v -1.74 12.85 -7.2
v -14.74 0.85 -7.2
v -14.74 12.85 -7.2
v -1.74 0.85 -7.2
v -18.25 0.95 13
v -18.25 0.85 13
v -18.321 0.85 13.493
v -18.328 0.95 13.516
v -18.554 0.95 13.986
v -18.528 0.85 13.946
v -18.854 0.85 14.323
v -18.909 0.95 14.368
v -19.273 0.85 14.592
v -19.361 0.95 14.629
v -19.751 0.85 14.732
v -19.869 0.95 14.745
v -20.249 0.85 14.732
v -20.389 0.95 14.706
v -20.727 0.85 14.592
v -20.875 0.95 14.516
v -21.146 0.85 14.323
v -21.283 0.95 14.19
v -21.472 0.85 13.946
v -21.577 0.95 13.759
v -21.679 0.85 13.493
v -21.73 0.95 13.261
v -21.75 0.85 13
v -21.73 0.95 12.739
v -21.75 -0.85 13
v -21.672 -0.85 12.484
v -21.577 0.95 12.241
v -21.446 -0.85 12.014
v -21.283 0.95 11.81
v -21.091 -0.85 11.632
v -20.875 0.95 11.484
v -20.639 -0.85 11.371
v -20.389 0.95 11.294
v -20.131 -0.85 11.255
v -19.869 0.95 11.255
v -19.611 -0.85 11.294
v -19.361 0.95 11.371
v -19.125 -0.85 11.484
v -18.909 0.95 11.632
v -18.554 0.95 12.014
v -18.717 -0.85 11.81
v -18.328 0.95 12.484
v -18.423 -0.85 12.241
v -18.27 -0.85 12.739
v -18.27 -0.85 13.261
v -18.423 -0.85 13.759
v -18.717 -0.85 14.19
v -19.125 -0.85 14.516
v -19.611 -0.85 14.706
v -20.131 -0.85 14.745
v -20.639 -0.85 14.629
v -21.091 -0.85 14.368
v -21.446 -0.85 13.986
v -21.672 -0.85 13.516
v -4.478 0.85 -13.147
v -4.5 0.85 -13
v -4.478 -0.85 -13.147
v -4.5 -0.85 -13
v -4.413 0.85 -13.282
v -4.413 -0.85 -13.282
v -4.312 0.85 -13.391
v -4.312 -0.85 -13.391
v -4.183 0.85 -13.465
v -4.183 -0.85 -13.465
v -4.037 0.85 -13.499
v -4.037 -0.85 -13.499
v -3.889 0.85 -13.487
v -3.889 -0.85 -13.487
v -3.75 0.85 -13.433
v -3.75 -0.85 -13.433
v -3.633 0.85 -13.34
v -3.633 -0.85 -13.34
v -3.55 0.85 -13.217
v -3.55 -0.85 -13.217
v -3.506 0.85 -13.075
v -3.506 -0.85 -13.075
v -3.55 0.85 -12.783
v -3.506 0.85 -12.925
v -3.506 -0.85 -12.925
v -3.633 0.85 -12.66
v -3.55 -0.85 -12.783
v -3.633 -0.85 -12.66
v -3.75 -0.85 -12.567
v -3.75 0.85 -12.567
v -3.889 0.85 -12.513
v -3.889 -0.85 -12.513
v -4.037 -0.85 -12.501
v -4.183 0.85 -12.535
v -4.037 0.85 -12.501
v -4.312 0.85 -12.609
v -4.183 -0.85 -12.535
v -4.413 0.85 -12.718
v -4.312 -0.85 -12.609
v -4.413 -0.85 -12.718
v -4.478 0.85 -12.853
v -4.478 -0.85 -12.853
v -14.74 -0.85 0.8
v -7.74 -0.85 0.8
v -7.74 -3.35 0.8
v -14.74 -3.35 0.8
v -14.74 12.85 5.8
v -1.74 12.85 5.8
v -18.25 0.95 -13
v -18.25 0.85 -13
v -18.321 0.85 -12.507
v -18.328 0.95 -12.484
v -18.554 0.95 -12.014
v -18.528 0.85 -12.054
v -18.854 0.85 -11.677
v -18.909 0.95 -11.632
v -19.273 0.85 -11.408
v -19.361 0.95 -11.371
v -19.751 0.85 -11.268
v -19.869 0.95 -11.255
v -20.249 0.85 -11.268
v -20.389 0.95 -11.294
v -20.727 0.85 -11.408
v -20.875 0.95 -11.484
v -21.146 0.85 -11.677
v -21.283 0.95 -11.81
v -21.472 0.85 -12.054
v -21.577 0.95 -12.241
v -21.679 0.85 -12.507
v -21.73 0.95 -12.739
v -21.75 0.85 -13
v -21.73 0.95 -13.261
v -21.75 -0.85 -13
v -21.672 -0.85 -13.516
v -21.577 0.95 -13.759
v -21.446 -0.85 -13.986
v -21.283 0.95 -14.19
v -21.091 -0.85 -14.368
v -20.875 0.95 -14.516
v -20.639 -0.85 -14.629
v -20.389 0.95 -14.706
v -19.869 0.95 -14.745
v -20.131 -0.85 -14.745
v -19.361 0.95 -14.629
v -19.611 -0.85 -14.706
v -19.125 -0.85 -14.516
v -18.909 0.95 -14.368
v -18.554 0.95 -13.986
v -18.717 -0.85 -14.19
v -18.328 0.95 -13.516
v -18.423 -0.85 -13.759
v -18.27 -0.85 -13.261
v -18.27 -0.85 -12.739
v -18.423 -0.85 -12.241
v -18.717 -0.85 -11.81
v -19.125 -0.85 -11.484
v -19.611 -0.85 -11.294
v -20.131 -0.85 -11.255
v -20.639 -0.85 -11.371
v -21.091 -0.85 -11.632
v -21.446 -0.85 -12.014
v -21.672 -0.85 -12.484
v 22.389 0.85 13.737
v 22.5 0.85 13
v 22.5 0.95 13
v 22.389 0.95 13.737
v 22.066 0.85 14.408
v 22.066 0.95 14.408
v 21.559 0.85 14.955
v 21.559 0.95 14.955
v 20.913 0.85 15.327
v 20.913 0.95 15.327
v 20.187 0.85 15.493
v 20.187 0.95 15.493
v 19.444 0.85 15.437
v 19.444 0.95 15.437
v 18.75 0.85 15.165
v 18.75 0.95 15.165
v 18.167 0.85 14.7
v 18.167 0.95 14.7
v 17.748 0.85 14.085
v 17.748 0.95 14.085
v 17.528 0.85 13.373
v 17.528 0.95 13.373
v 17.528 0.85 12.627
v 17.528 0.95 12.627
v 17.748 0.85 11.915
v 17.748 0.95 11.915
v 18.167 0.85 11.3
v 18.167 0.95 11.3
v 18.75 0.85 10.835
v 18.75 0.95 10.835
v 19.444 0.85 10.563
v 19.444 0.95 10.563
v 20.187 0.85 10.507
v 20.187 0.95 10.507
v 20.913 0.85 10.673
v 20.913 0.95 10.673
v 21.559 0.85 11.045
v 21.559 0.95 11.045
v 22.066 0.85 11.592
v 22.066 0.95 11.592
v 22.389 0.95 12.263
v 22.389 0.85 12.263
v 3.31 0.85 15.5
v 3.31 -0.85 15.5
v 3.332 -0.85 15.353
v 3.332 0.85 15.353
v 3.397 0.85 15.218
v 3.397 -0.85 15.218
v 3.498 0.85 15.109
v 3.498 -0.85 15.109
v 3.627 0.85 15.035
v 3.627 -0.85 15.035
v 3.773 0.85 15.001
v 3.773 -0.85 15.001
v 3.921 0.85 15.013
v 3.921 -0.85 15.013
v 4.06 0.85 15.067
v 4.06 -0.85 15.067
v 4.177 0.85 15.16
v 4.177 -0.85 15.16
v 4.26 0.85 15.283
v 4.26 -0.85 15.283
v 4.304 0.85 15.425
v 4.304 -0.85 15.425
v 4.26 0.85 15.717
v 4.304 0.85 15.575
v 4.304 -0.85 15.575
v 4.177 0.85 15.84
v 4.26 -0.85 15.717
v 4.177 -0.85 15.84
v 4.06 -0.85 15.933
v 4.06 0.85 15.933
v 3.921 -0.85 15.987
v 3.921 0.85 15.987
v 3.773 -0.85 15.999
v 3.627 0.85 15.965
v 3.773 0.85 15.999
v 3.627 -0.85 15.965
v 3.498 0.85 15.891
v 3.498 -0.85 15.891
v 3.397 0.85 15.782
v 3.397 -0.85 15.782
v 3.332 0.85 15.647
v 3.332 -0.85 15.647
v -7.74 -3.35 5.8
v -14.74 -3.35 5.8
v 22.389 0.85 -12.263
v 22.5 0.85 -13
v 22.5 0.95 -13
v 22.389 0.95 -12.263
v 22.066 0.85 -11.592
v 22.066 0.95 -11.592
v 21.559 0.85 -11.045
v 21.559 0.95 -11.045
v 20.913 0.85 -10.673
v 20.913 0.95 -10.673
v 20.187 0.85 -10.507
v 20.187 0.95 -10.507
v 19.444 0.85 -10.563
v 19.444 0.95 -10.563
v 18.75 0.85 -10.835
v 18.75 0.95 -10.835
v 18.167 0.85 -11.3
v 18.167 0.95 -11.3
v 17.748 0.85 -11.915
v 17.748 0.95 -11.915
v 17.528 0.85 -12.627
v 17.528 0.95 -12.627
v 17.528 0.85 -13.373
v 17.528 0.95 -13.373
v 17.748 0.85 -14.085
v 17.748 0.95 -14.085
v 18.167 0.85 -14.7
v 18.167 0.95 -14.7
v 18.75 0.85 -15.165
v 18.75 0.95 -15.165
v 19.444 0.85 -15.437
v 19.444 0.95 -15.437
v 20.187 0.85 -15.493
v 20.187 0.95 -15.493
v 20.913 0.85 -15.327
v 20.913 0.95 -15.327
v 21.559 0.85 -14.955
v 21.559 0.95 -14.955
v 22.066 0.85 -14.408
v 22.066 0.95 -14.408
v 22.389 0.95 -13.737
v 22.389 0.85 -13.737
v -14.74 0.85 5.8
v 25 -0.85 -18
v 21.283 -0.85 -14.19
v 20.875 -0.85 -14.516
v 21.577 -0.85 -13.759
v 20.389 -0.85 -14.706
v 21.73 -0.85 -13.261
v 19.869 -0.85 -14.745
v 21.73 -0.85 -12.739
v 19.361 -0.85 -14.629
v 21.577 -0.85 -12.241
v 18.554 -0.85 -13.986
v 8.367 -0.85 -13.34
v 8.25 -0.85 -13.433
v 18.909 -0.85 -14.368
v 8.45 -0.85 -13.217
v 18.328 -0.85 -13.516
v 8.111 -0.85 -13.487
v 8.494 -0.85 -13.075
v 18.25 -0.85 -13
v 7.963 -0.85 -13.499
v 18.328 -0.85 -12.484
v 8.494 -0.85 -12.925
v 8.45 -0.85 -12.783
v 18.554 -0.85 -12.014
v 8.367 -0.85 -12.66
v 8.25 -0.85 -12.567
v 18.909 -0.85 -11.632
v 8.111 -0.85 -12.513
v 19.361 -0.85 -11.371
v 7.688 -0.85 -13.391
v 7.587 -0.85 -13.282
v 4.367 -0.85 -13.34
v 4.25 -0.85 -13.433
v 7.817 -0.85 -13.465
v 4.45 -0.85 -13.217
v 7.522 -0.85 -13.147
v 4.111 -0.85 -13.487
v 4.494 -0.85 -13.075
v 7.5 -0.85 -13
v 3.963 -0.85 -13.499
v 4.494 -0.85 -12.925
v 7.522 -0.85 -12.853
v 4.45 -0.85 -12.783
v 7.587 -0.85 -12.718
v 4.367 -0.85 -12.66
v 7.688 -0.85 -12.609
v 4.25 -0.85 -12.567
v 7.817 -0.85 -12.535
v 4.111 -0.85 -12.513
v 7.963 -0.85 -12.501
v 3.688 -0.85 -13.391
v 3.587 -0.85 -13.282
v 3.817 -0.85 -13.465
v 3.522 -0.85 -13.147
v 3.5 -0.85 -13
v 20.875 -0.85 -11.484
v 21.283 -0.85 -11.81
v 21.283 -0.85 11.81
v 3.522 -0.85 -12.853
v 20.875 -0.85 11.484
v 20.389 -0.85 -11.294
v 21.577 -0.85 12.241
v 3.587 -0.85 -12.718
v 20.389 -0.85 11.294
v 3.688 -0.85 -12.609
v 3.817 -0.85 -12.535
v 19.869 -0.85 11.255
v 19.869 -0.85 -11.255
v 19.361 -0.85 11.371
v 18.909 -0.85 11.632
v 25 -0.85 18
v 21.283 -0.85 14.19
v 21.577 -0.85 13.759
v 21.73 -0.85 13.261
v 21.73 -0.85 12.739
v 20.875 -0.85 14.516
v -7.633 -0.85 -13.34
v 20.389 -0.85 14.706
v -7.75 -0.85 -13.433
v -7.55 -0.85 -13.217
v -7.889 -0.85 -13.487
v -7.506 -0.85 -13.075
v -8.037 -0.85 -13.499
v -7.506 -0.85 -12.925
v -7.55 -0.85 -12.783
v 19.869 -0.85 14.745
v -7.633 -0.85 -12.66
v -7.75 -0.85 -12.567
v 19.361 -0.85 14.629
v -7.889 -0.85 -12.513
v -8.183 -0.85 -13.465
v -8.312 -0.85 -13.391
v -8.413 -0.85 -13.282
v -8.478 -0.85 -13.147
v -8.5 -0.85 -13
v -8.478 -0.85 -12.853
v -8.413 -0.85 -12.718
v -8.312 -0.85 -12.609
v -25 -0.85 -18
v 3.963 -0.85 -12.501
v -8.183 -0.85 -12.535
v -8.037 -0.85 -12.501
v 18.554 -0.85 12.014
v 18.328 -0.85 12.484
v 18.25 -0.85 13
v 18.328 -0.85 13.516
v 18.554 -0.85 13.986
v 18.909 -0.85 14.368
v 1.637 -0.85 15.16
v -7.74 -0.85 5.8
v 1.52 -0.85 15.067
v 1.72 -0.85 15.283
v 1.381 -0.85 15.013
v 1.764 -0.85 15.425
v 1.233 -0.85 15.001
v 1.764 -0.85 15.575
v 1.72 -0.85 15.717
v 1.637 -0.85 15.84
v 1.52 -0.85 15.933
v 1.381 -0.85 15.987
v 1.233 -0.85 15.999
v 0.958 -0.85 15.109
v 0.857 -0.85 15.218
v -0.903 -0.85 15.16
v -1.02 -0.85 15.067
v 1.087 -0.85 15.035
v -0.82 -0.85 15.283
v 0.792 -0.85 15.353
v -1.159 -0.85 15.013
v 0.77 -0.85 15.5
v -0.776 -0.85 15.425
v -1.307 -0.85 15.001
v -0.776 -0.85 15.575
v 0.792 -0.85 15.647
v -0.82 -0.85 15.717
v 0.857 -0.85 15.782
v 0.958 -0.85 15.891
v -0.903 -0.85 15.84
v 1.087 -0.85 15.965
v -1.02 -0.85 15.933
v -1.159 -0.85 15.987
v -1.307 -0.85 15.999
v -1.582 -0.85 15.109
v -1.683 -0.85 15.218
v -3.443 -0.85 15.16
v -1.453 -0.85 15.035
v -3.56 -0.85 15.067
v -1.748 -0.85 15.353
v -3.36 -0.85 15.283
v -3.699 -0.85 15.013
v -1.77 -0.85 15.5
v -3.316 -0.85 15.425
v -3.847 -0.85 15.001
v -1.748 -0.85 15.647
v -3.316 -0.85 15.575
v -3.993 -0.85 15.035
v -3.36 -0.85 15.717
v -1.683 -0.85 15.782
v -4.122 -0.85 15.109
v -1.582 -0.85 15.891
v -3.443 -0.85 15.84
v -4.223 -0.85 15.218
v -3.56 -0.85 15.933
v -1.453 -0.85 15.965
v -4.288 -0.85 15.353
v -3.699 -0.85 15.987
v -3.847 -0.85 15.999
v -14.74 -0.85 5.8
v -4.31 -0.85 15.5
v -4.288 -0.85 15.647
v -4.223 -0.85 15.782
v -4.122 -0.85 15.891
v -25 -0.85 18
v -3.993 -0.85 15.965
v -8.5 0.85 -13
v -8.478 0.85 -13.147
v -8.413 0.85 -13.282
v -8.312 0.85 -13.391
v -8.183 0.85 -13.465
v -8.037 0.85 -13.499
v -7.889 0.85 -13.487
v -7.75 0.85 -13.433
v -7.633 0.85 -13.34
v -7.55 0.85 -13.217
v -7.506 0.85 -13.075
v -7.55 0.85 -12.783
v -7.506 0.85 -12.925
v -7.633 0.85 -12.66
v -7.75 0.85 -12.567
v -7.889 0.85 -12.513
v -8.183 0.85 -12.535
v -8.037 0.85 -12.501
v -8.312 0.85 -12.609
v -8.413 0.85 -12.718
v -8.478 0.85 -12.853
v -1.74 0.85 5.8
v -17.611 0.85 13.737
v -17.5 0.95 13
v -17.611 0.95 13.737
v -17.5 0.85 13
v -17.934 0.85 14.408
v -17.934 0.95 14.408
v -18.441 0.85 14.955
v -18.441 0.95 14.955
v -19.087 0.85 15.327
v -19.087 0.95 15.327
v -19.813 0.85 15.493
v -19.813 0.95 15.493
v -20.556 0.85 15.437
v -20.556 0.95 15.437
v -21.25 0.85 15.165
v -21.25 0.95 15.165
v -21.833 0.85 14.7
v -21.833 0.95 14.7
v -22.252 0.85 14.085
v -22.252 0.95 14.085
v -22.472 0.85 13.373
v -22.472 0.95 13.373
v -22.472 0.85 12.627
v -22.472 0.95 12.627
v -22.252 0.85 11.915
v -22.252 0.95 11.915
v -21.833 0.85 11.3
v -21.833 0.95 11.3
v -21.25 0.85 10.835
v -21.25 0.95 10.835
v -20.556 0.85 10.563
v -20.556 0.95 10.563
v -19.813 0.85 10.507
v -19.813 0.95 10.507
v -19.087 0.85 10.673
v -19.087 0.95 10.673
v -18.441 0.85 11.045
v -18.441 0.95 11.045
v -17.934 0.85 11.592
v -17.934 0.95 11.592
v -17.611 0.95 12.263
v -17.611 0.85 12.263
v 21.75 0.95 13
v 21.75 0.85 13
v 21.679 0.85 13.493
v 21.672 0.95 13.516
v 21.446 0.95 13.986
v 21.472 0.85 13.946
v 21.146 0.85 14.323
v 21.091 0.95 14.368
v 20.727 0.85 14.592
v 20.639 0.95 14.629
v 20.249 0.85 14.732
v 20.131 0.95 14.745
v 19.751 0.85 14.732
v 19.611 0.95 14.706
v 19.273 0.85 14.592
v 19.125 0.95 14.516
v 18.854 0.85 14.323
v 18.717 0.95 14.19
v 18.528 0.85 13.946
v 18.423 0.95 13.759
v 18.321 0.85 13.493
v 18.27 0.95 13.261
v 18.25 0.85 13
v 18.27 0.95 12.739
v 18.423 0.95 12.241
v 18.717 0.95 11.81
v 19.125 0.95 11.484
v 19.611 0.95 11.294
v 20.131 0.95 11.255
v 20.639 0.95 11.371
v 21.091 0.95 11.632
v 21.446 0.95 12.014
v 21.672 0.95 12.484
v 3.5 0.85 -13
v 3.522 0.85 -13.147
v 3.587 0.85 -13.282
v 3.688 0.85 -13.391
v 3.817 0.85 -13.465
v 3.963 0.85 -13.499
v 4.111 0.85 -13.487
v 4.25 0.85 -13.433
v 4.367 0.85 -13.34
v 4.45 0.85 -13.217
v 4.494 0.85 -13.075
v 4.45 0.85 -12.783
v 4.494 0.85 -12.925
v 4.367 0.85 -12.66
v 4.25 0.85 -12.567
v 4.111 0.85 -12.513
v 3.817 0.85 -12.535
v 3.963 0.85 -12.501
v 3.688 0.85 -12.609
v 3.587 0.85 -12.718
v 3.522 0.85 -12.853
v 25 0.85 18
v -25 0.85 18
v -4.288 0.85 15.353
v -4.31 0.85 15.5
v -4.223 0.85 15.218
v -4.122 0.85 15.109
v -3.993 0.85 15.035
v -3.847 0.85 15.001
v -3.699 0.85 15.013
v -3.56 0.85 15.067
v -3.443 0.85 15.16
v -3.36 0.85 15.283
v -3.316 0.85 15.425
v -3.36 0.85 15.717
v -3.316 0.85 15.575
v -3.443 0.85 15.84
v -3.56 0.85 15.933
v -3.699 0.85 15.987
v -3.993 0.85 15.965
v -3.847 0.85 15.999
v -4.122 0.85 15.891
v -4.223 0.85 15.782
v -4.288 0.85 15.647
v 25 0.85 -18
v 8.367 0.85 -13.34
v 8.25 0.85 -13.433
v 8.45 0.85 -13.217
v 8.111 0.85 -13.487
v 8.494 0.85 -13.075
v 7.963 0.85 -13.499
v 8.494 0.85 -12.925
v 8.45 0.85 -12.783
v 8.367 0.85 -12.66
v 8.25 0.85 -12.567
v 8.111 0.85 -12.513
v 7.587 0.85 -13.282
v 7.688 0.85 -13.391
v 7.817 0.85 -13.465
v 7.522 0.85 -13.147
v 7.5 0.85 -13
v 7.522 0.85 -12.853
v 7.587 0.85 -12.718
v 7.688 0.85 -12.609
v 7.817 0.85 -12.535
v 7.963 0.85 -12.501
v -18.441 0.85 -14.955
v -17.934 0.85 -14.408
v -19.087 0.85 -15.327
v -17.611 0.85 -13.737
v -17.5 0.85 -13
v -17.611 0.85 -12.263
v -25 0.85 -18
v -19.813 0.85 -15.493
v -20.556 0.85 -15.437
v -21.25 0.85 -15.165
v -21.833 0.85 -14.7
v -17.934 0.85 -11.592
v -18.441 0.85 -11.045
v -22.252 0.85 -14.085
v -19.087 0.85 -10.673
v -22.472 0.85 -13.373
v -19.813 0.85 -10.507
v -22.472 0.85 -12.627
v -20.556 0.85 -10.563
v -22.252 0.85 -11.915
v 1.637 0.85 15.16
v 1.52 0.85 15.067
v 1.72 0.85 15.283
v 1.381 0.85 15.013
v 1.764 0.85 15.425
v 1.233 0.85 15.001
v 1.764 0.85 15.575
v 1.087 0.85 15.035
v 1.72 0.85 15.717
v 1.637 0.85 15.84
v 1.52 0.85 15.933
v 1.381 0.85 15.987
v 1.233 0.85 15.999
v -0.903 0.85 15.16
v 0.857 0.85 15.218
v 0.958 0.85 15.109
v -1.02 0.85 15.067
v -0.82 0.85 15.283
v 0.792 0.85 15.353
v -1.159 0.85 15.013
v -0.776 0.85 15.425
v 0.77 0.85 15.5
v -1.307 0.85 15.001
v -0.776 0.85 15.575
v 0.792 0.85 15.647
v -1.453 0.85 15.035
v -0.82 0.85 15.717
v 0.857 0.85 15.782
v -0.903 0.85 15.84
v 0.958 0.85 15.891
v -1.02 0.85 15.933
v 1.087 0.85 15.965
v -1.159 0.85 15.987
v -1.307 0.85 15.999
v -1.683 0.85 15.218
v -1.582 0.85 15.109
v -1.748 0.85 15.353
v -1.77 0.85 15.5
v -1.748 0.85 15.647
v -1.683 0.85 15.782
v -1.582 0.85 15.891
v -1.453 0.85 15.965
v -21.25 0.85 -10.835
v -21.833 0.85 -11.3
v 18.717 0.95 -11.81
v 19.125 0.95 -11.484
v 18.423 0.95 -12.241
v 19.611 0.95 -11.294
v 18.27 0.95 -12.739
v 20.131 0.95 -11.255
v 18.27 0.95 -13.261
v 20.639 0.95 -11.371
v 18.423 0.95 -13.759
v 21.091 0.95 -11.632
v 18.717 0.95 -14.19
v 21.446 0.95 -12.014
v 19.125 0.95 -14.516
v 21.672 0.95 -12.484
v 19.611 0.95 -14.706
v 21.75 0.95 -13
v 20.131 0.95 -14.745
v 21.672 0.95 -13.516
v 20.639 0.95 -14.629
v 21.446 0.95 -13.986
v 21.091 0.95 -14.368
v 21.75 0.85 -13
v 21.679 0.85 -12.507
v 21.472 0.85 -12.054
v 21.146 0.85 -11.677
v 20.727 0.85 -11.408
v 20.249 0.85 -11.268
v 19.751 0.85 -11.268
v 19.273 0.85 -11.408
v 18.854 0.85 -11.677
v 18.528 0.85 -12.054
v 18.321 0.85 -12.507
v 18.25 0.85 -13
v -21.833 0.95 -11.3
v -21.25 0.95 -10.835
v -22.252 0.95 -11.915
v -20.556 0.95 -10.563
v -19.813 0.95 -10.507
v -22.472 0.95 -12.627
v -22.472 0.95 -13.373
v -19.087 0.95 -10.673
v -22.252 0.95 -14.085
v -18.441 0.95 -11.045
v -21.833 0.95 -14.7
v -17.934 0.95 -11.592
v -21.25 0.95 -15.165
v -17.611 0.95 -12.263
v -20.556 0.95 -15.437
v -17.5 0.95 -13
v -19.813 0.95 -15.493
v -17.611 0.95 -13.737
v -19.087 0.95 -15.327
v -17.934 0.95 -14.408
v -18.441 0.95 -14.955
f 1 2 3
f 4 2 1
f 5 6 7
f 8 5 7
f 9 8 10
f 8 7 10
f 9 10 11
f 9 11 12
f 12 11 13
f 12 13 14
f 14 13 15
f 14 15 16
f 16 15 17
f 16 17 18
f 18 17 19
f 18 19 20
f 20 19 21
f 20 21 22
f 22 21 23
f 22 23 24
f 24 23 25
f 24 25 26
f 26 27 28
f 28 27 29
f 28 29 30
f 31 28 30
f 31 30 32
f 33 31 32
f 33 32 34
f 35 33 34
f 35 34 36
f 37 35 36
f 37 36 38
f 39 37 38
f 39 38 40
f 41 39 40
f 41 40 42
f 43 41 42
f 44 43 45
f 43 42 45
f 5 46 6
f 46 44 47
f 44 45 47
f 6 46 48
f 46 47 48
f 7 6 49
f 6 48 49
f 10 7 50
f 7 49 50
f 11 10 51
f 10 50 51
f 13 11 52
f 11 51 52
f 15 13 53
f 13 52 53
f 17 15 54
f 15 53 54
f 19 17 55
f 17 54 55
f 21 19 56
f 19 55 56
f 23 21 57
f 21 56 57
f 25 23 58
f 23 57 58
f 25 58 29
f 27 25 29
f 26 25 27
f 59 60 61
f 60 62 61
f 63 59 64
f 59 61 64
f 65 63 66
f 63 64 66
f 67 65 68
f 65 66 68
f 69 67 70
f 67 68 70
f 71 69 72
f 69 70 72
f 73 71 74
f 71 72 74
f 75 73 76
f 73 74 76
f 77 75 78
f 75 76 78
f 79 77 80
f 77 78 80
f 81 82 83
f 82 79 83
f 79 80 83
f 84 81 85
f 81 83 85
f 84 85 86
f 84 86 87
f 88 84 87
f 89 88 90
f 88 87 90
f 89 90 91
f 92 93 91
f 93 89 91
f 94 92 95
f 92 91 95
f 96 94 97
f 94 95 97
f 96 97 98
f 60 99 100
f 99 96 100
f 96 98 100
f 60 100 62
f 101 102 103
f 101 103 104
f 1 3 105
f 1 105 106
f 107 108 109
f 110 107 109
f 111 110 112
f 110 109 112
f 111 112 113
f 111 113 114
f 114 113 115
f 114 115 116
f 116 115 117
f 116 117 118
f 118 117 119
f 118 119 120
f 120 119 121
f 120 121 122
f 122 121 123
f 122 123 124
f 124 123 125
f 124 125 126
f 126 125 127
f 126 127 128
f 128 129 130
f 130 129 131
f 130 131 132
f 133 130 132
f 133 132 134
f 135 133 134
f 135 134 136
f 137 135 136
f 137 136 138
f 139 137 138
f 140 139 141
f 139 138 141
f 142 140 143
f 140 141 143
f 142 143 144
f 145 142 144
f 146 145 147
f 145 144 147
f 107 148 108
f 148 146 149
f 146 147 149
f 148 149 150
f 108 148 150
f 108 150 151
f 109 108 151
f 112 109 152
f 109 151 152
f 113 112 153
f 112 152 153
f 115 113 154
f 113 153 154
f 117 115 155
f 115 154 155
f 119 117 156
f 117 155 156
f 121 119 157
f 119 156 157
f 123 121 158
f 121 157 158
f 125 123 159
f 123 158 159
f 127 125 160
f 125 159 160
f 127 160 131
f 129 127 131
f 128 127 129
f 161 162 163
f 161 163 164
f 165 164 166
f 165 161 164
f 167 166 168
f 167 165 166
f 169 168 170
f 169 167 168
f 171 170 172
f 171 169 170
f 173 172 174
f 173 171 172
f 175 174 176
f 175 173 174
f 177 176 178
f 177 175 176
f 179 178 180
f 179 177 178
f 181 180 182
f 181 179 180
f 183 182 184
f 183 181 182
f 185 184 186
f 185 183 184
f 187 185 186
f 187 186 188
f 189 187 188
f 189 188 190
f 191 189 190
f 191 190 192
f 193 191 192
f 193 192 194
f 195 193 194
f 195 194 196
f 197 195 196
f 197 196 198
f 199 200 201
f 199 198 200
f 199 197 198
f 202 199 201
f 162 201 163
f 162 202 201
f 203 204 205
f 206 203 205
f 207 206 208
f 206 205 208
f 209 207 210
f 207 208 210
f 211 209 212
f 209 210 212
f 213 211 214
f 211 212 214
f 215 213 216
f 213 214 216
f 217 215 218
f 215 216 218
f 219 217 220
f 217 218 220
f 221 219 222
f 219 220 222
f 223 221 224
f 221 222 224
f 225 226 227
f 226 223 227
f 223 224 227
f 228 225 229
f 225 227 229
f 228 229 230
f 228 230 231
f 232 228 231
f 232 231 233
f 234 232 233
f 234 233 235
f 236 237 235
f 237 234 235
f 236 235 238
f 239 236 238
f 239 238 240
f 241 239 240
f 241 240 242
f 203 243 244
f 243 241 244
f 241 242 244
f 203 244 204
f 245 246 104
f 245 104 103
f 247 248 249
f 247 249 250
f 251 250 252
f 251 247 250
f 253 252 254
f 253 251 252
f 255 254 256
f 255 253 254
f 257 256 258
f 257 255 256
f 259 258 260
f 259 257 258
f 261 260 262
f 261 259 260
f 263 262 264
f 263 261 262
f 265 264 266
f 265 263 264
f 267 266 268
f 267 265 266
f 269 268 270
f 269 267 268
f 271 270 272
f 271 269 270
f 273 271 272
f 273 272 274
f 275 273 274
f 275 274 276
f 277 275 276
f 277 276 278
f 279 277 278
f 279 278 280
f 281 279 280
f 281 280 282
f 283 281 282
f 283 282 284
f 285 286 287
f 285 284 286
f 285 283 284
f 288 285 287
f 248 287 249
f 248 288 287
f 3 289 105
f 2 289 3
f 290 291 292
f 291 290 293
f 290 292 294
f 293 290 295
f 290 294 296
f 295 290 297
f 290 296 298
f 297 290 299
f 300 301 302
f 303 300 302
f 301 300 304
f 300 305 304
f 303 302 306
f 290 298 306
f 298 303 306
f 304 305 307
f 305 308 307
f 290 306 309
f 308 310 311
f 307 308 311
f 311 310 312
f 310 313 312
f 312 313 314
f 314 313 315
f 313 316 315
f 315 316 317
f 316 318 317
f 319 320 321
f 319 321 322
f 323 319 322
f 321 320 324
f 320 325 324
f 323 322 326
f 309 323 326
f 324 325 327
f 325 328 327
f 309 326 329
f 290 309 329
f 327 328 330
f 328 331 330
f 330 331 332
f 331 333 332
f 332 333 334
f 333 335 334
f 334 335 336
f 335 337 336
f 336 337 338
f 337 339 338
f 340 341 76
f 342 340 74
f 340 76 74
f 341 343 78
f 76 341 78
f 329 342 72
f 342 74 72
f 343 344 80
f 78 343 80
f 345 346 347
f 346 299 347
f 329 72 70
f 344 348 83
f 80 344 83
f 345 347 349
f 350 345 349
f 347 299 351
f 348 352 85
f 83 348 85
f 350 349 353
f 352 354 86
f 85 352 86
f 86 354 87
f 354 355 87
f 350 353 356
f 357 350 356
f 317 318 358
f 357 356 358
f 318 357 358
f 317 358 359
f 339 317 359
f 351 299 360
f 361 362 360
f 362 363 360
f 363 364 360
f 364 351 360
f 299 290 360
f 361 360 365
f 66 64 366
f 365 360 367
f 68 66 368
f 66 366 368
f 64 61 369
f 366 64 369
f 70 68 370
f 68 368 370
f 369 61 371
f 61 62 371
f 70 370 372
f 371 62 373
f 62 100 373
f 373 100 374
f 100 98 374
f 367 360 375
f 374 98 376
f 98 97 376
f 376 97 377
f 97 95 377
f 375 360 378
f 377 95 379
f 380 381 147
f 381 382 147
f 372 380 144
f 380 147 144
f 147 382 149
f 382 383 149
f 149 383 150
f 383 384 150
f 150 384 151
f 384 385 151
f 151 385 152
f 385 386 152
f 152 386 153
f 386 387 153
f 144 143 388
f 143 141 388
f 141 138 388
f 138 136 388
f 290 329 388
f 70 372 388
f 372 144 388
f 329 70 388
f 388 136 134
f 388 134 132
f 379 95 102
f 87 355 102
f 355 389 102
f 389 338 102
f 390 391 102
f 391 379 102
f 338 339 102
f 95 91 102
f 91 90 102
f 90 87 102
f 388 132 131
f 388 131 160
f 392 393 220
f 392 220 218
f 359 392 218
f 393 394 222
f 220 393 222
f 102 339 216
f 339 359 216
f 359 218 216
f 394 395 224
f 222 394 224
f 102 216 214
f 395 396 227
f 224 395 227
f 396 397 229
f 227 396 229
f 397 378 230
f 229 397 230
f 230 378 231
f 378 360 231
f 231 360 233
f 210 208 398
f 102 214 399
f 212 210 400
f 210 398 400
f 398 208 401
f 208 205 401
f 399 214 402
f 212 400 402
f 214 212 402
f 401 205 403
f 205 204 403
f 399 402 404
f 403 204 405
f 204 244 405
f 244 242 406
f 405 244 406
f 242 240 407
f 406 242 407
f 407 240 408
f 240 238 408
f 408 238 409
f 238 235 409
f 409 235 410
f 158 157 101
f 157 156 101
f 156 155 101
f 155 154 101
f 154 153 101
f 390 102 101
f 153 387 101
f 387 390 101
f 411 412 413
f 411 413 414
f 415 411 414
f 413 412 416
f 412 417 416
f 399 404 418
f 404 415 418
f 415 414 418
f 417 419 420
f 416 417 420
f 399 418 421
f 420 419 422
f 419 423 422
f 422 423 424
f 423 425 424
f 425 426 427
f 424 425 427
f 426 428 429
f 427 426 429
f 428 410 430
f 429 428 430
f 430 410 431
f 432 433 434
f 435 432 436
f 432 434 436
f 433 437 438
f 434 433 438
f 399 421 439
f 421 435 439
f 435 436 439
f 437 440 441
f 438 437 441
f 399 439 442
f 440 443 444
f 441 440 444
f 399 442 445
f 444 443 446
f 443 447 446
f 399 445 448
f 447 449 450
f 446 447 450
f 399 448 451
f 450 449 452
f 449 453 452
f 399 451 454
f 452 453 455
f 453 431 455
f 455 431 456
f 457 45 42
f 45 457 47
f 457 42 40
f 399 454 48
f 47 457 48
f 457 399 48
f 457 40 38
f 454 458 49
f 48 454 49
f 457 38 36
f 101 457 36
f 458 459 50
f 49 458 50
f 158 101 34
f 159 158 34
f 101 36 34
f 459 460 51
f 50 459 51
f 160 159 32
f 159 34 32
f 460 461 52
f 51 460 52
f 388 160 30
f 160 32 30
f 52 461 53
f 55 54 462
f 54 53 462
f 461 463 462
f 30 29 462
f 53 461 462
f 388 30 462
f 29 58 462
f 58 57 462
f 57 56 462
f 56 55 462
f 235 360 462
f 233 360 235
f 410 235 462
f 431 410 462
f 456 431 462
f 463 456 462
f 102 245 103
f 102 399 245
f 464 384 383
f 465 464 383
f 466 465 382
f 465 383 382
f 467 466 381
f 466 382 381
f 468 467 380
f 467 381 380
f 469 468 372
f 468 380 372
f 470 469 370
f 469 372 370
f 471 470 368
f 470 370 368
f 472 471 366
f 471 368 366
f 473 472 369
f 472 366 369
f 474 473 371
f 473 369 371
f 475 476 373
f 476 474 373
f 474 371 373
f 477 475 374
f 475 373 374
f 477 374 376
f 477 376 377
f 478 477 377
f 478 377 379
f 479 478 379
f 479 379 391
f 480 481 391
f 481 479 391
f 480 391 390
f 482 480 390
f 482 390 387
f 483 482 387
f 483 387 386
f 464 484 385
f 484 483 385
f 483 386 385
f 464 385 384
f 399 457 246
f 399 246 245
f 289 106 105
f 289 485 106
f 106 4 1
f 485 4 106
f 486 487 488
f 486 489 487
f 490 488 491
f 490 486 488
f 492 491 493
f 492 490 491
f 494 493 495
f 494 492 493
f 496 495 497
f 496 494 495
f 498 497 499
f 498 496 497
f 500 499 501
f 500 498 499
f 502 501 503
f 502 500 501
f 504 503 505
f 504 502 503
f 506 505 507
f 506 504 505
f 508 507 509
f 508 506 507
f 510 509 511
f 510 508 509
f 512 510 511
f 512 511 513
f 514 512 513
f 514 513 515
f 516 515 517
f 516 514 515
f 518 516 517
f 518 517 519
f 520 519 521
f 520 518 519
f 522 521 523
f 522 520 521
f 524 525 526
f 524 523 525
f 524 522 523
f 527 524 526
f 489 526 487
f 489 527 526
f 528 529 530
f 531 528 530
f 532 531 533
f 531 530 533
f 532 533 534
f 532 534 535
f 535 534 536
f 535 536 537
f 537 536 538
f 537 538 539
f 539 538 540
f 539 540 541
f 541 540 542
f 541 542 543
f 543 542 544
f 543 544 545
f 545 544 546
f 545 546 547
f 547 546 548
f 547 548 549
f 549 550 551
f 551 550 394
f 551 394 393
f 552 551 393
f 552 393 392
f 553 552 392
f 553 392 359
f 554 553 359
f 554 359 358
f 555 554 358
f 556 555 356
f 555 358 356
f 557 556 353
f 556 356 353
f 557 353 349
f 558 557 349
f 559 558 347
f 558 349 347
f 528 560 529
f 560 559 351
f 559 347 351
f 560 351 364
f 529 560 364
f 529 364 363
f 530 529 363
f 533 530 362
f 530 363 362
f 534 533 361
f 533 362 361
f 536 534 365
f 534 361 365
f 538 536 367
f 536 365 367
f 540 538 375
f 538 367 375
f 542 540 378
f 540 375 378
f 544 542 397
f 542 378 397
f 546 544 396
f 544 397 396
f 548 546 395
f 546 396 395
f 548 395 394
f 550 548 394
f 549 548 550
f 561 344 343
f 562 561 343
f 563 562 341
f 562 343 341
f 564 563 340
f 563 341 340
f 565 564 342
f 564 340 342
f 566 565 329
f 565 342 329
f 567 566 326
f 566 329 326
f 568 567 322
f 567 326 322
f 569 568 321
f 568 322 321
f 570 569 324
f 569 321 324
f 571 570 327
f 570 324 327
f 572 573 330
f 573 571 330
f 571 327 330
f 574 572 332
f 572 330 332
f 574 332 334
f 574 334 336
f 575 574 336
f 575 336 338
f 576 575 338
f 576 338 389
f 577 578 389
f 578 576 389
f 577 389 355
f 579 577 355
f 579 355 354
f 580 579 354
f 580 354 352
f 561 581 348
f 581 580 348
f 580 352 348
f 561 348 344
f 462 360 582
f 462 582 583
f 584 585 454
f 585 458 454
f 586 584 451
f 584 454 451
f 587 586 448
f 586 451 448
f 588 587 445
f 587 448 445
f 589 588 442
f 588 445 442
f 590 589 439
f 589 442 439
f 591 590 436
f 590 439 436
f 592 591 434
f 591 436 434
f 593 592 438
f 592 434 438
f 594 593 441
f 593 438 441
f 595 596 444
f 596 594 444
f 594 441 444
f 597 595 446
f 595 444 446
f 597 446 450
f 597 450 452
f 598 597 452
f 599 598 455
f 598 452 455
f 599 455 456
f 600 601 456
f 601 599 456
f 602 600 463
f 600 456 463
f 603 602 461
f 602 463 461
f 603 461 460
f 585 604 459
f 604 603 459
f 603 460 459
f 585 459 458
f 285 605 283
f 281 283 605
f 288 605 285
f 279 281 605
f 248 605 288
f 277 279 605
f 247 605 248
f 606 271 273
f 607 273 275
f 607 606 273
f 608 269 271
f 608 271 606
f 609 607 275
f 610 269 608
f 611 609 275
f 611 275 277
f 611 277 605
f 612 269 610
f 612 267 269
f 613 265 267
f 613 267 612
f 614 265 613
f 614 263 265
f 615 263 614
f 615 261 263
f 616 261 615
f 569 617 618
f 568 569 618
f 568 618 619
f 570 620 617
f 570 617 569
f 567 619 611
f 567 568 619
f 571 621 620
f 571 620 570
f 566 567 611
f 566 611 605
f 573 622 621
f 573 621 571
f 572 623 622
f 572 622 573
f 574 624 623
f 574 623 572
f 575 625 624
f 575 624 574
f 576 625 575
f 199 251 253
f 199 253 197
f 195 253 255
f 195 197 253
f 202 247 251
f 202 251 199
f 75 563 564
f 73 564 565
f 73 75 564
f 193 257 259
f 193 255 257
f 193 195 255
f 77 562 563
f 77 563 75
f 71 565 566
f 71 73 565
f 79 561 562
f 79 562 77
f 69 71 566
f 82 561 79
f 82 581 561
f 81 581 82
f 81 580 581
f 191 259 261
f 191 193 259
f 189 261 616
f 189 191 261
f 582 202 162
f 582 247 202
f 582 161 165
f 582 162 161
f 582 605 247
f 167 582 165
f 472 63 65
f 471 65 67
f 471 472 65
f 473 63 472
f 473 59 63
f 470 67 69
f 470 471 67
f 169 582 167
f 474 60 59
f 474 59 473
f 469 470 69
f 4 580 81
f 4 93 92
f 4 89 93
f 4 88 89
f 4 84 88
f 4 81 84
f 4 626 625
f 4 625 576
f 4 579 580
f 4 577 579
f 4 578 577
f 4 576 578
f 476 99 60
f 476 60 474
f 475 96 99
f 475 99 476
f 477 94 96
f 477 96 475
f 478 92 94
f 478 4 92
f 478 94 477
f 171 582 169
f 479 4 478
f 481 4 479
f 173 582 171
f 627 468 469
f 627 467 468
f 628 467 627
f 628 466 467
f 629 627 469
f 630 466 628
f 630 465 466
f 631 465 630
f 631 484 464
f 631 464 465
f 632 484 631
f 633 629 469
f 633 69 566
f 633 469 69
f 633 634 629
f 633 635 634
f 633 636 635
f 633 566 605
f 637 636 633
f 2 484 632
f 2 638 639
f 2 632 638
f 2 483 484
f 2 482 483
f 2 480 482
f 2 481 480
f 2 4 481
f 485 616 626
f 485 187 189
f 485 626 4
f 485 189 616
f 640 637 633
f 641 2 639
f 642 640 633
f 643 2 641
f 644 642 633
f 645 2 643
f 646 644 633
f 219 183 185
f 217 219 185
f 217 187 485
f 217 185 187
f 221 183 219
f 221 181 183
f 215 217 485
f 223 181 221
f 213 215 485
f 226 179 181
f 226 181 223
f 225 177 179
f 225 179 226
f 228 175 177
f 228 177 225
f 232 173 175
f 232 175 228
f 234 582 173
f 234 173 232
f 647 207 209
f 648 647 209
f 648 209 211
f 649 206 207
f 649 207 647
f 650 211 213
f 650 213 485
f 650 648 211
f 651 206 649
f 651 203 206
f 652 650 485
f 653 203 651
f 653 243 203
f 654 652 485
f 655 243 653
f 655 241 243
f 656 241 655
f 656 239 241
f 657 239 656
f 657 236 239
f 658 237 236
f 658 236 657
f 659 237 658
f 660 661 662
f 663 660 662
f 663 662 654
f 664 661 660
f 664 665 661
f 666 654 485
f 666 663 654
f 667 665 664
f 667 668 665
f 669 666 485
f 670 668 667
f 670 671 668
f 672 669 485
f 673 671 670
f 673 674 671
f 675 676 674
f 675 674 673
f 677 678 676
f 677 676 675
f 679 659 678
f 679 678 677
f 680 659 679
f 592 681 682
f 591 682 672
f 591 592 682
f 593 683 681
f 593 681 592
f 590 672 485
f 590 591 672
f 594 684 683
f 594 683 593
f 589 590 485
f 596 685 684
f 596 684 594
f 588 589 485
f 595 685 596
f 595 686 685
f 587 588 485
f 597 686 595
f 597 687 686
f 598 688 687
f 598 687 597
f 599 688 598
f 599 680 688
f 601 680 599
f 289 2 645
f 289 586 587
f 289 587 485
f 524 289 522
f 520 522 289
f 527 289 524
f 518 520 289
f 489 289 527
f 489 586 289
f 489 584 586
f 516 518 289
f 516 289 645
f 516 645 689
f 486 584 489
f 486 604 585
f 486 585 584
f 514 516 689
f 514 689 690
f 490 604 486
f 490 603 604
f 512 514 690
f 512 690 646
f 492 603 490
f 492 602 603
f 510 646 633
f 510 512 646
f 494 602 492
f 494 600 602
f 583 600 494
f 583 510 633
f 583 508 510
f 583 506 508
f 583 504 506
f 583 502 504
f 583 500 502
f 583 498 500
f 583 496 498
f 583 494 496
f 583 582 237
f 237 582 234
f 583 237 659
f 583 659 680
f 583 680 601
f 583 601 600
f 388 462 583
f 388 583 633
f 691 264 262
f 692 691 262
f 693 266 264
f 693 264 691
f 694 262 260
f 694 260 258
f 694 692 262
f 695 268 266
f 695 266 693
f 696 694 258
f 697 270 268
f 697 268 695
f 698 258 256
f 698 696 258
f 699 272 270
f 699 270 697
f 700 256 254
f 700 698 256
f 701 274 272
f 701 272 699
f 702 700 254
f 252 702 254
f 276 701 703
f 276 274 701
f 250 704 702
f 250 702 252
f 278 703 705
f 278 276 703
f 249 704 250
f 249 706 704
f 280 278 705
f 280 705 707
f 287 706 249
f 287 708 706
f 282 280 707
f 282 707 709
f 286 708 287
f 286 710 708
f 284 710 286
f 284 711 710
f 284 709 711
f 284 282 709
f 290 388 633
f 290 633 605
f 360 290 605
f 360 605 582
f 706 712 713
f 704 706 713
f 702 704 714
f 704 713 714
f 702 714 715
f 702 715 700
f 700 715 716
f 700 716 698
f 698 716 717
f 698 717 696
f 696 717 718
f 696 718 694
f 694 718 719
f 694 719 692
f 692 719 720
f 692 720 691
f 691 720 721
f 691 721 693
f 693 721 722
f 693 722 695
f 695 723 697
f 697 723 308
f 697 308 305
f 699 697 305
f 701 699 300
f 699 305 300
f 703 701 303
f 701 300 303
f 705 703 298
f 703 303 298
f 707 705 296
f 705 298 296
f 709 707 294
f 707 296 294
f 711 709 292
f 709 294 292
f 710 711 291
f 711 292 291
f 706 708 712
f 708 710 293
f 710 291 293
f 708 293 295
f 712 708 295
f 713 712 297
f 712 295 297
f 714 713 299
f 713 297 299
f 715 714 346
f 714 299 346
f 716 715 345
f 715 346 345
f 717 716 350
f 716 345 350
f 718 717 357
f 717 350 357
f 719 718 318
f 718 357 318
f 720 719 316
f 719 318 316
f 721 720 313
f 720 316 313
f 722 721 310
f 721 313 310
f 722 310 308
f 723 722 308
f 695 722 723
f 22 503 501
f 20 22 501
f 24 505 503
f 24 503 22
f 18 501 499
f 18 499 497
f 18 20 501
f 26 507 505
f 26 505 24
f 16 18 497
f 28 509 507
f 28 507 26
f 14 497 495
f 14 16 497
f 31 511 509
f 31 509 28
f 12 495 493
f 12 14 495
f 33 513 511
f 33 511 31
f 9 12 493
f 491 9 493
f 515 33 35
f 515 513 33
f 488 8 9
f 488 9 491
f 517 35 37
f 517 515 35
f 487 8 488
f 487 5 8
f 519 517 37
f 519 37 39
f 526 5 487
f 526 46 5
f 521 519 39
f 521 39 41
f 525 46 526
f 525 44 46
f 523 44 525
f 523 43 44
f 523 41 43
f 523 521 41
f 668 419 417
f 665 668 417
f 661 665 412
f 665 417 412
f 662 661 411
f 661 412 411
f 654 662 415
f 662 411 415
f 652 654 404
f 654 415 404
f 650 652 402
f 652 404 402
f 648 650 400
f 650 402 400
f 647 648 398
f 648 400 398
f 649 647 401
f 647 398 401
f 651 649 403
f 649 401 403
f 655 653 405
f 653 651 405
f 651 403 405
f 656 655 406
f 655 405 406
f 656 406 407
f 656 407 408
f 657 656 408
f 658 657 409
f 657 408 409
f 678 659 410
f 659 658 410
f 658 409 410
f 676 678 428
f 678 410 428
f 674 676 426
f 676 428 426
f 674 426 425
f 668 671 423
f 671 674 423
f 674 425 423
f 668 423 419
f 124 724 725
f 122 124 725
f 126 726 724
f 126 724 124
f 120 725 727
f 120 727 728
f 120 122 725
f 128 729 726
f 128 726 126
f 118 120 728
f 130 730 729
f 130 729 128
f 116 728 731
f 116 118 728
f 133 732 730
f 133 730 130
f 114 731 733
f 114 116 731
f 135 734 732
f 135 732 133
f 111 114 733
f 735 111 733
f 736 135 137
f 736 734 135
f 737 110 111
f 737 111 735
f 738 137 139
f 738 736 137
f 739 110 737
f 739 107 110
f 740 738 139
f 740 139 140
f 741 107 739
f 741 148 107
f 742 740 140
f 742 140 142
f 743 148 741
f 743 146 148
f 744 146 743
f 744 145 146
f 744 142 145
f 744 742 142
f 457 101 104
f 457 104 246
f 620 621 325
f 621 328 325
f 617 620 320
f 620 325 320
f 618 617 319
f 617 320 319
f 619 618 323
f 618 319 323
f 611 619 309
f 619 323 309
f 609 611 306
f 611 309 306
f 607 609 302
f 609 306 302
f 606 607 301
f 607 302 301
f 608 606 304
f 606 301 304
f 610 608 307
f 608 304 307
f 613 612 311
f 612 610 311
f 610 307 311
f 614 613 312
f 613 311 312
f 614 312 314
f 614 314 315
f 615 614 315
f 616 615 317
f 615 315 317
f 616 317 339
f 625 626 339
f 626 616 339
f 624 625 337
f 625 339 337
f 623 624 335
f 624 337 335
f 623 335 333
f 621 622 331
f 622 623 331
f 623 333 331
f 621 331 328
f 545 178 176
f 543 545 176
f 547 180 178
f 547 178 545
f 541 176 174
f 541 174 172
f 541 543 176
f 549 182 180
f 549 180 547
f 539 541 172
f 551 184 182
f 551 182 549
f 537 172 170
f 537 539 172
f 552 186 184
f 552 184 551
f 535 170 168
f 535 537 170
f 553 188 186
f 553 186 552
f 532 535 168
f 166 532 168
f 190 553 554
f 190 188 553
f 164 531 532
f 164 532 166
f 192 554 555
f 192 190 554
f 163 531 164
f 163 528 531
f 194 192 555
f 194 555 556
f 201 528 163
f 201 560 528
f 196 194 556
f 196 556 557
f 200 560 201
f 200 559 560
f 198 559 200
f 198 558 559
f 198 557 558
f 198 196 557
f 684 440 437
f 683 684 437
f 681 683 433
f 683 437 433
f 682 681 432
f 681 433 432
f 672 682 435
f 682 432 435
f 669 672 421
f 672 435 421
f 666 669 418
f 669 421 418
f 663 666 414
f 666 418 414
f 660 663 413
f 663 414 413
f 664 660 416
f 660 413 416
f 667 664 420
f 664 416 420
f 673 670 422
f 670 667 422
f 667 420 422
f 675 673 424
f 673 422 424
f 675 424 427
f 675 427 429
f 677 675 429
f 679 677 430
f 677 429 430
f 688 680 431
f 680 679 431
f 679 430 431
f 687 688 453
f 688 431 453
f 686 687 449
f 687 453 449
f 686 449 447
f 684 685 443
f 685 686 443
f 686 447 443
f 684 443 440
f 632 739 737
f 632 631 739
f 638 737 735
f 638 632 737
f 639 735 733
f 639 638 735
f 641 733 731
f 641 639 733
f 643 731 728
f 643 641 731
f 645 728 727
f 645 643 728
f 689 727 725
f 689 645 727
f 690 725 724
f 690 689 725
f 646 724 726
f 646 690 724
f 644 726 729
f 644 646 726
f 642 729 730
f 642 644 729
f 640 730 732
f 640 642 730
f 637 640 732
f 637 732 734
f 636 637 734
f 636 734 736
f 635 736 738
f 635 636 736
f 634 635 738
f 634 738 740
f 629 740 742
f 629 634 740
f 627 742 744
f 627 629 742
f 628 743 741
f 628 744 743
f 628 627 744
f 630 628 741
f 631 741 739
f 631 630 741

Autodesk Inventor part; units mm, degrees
ref_plane "YZ Plane" through (0, 0, 0) normal (1, 0, 0) x (0, 1, 0)
ref_plane "XZ Plane" through (0, 0, 0) normal (0, 1, 0) x (-1, 0, 0)
ref_plane "XY Plane" through (0, 0, 0) normal (0, 0, 1) x (1, 0, 0)
sketch "Sketch1" plane through (0, 0, 0) normal (0, 1, 0) x (-1, 0, 0)
  line L0 (25, -18) -> (-25, -18)
  line L1 (-25, -18) -> (-25, 18)
  line L2 (-25, 18) -> (25, 18)
  line L3 (25, 18) -> (25, -18)
  line L4 (25, 0) -> (25, 18)
  line L5 (25, 18) -> (0, 18)
  circle A0 centre (20, 13) radius 1.75
  circle A1 centre (-20, 13) radius 1.75
  circle A2 centre (20, -13) radius 1.75
  circle A3 centre (-20, -13) radius 1.75
  line L6 (0, -18) -> (0, 18) construction
  circle A4 centre (1.27, 15.5) radius 0.5
  circle A5 centre (3.81, 15.5) radius 0.5
  circle A6 centre (-1.27, 15.5) radius 0.5
  circle A7 centre (-3.81, 15.5) radius 0.5
  circle A8 centre (-4, -13) radius 0.5
  circle A9 centre (-8, -13) radius 0.5
  circle A10 centre (4, -13) radius 0.5
  circle A11 centre (8, -13) radius 0.5
  point P0 (0, 0)
  dimension "d0" = 50
  dimension "d1" = 36
  dimension "d10" = 3.5
  dimension "d12" = 5
  dimension "d13" = 5
  dimension "d16" = 1
  dimension "d17" = 1.27
  dimension "d18" = 2.5
  dimension "d19" = 1
  dimension "d20" = 2.54
  dimension "d21" = 1
  dimension "d22" = 4
  dimension "d23" = 1
  dimension "d24" = 4
  dimension "d41" = 12
  dimension "d43" = 40
  dimension "d44" = 26
extrude "Extrusion1" add sketch "Sketch1" along normal mid plane 1.7
sketch "Sketch2" plane through (0, 0.85, 0) normal (0, 1, 0) x (1, 0, 0)
  line L0 (-14.7399, 7.1996) -> (-1.7399, 7.1996)
  line L1 (-1.7399, 7.1996) -> (-1.7399, -5.8004)
  line L2 (-1.7399, -5.8004) -> (-14.7399, -5.8004)
  line L3 (-14.7399, -5.8004) -> (-14.7399, 7.1996)
  point P0 (0, 0)
  dimension "d27" = 13
  dimension "d28" = 13
extrude "Extrusion2" add sketch "Sketch2" along normal blind 12
sketch "Sketch3" plane through (0, -0.85, 0) normal (0, -1, 0) x (1, 0, 0)
  line L0 (-14.7399, 5.8004) -> (-7.7399, 5.8004)
  line L1 (-7.7399, 5.8004) -> (-7.7399, 0.8004)
  line L2 (-7.7399, 0.8004) -> (-14.7399, 0.8004)
  line L3 (-14.7399, 0.8004) -> (-14.7399, 5.8004)
  point P0 (0, 0)
  dimension "d31" = 7
  dimension "d32" = 5
extrude "Extrusion3" add sketch "Sketch3" along normal blind 2.5
sketch "Sketch4" plane through (0, 0.85, 0) normal (0, 1, 0) x (1, 0, 0)
  line L0 (-4.7519, -12.75) -> (-3.9944, -12.75) construction
  line L1 (-3.9944, -12.75) -> (-3.9944, -13.9894) construction
  line L2 (-3.9944, -13.9894) -> (-4.7519, -13.9894) construction
  line L3 (-4.7519, -13.9894) -> (-4.7519, -12.75) construction
  line L4 (-2.1513, -12.7634) -> (-1.6525, -12.7634) construction
  line L5 (-1.6525, -12.7634) -> (-1.6525, -14.0027) construction
  line L6 (-1.6525, -14.0027) -> (-2.1513, -14.0027) construction
  line L7 (-2.1513, -14.0027) -> (-2.1513, -12.7634) construction
  line L8 (0.0686, -14.1363) -> (0.0686, -12.897) construction
  line L9 (0.0686, -12.897) -> (0.5673, -12.897) construction
  line L10 (0.5673, -12.897) -> (0.5673, -14.1363) construction
  line L11 (0.5673, -14.1363) -> (0.0686, -14.1363) construction
  line L12 (1.0686, 4.3486) -> (9.004, 4.3486) construction
  line L13 (9.004, 4.3486) -> (9.004, 3.8499) construction
  line L14 (9.004, 3.8499) -> (1.0686, 3.8499) construction
  line L15 (1.0686, 3.8499) -> (1.0686, 4.3486) construction
  line L16 (2.9588, -14.8877) -> (2.9588, -13.6483) construction
  line L17 (2.9588, -13.6483) -> (3.4575, -13.6483) construction
  line L18 (3.4575, -13.6483) -> (3.4575, -14.8877) construction
  line L19 (3.4575, -14.8877) -> (2.9588, -14.8877) construction
  line L20 (-3.0733, 9.8872) -> (-3.8308, 9.8872) construction
  line L21 (-3.8308, 9.8872) -> (-3.8308, 11.1266) construction
  line L22 (-3.8308, 11.1266) -> (-3.0733, 11.1266) construction
  line L23 (-3.0733, 11.1266) -> (-3.0733, 9.8872) construction
  line L24 (4.9547, 10.9292) -> (4.9547, 9.7419) construction
  line L25 (4.9547, 9.7419) -> (4.1972, 9.7419) construction
  line L26 (4.1972, 9.7419) -> (4.1972, 10.9292) construction
  line L27 (4.1972, 10.9292) -> (4.9547, 10.9292) construction
  line L28 (9.0783, 10.888) -> (9.0783, 9.7007) construction
  line L29 (9.0783, 9.7007) -> (8.3208, 9.7007) construction
  line L30 (8.3208, 9.7007) -> (8.3208, 10.888) construction
  line L31 (8.3208, 10.888) -> (9.0783, 10.888) construction
  line L32 (-6.789, 11.003) -> (-6.789, 9.8157) construction
  line L33 (-6.789, 9.8157) -> (-7.5465, 9.8157) construction
  line L34 (-7.5465, 9.8157) -> (-7.5465, 11.003) construction
  line L35 (-7.5465, 11.003) -> (-6.789, 11.003) construction
  point P0 (0, 0)
  point P1 (19.4358, -0.4507)
sketch "Sketch5" plane through (0, 0.85, 0) normal (0, 1, 0) x (1, 0, 0)
  circle A0 centre (-20, 13) radius 1.75 projected
  circle A1 centre (20, 13) radius 1.75 projected
  circle A2 centre (20, -13) radius 1.75 projected
  circle A3 centre (-20, -13) radius 1.75 projected
  circle A4 centre (-20, 13) radius 2.5
  circle A5 centre (-20, -13) radius 2.5
  circle A6 centre (20, 13) radius 2.5
  circle A7 centre (20, -13) radius 2.5
  point P0 (0, 0)
  dimension "d35" = 5
  dimension "d36" = 5
  dimension "d37" = 5
  dimension "d38" = 5
extrude "Extrusion4" add sketch "Sketch5" along normal blind 0.1
sketch "Sketch6" plane through (0, -0.85, 0) normal (0, -1, 0) x (1, 0, 0)
  line L0 (-3.0976, -15.0106) -> (-3.0976, -16.25) construction
  line L1 (-3.0976, -16.25) -> (-3.8551, -16.25) construction
  line L2 (-3.8551, -16.25) -> (-3.8551, -15.0106) construction
  line L3 (-3.8551, -15.0106) -> (-3.0976, -15.0106) construction
  line L4 (4.9305, -15.208) -> (4.9305, -16.3953) construction
  line L5 (4.9305, -16.3953) -> (4.173, -16.3953) construction
  line L6 (4.173, -16.3953) -> (4.173, -15.208) construction
  line L7 (4.173, -15.208) -> (4.9305, -15.208) construction
  line L8 (9.0541, -15.2492) -> (9.0541, -16.4365) construction
  line L9 (9.0541, -16.4365) -> (8.2966, -16.4365) construction
  line L10 (8.2966, -16.4365) -> (8.2966, -15.2492) construction
  line L11 (8.2966, -15.2492) -> (9.0541, -15.2492) construction
  line L12 (-6.8133, -15.1342) -> (-6.8133, -16.3215) construction
  line L13 (-6.8133, -16.3215) -> (-7.5708, -16.3215) construction
  line L14 (-7.5708, -16.3215) -> (-7.5708, -15.1342) construction
  line L15 (-7.5708, -15.1342) -> (-6.8133, -15.1342) construction
  line L16 (-4.6604, 14.3064) -> (-3.9029, 14.3064) construction
  line L17 (-3.9029, 14.3064) -> (-3.9029, 13.067) construction
  line L18 (-3.9029, 13.067) -> (-4.6604, 13.067) construction
  line L19 (-4.6604, 13.067) -> (-4.6604, 14.3064) construction
  line L20 (-2.0597, 13.0536) -> (-2.0597, 14.293) construction
  line L21 (-2.0597, 14.293) -> (-1.561, 14.293) construction
  line L22 (-1.561, 14.293) -> (-1.561, 13.0536) construction
  line L23 (-1.561, 13.0536) -> (-2.0597, 13.0536) construction
  line L24 (0.1602, 12.92) -> (0.1602, 14.1594) construction
  line L25 (0.1602, 14.1594) -> (0.6589, 14.1594) construction
  line L26 (0.6589, 14.1594) -> (0.6589, 12.92) construction
  line L27 (0.6589, 12.92) -> (0.1602, 12.92) construction
  line L28 (3.0504, 12.1687) -> (3.0504, 13.408) construction
  line L29 (3.0504, 13.408) -> (3.5491, 13.408) construction
  line L30 (3.5491, 13.408) -> (3.5491, 12.1687) construction
  line L31 (3.5491, 12.1687) -> (3.0504, 12.1687) construction
  point P0 (0, 0)
  point P1 (19.4358, -0.4507)
properties part number "UVTRON"
